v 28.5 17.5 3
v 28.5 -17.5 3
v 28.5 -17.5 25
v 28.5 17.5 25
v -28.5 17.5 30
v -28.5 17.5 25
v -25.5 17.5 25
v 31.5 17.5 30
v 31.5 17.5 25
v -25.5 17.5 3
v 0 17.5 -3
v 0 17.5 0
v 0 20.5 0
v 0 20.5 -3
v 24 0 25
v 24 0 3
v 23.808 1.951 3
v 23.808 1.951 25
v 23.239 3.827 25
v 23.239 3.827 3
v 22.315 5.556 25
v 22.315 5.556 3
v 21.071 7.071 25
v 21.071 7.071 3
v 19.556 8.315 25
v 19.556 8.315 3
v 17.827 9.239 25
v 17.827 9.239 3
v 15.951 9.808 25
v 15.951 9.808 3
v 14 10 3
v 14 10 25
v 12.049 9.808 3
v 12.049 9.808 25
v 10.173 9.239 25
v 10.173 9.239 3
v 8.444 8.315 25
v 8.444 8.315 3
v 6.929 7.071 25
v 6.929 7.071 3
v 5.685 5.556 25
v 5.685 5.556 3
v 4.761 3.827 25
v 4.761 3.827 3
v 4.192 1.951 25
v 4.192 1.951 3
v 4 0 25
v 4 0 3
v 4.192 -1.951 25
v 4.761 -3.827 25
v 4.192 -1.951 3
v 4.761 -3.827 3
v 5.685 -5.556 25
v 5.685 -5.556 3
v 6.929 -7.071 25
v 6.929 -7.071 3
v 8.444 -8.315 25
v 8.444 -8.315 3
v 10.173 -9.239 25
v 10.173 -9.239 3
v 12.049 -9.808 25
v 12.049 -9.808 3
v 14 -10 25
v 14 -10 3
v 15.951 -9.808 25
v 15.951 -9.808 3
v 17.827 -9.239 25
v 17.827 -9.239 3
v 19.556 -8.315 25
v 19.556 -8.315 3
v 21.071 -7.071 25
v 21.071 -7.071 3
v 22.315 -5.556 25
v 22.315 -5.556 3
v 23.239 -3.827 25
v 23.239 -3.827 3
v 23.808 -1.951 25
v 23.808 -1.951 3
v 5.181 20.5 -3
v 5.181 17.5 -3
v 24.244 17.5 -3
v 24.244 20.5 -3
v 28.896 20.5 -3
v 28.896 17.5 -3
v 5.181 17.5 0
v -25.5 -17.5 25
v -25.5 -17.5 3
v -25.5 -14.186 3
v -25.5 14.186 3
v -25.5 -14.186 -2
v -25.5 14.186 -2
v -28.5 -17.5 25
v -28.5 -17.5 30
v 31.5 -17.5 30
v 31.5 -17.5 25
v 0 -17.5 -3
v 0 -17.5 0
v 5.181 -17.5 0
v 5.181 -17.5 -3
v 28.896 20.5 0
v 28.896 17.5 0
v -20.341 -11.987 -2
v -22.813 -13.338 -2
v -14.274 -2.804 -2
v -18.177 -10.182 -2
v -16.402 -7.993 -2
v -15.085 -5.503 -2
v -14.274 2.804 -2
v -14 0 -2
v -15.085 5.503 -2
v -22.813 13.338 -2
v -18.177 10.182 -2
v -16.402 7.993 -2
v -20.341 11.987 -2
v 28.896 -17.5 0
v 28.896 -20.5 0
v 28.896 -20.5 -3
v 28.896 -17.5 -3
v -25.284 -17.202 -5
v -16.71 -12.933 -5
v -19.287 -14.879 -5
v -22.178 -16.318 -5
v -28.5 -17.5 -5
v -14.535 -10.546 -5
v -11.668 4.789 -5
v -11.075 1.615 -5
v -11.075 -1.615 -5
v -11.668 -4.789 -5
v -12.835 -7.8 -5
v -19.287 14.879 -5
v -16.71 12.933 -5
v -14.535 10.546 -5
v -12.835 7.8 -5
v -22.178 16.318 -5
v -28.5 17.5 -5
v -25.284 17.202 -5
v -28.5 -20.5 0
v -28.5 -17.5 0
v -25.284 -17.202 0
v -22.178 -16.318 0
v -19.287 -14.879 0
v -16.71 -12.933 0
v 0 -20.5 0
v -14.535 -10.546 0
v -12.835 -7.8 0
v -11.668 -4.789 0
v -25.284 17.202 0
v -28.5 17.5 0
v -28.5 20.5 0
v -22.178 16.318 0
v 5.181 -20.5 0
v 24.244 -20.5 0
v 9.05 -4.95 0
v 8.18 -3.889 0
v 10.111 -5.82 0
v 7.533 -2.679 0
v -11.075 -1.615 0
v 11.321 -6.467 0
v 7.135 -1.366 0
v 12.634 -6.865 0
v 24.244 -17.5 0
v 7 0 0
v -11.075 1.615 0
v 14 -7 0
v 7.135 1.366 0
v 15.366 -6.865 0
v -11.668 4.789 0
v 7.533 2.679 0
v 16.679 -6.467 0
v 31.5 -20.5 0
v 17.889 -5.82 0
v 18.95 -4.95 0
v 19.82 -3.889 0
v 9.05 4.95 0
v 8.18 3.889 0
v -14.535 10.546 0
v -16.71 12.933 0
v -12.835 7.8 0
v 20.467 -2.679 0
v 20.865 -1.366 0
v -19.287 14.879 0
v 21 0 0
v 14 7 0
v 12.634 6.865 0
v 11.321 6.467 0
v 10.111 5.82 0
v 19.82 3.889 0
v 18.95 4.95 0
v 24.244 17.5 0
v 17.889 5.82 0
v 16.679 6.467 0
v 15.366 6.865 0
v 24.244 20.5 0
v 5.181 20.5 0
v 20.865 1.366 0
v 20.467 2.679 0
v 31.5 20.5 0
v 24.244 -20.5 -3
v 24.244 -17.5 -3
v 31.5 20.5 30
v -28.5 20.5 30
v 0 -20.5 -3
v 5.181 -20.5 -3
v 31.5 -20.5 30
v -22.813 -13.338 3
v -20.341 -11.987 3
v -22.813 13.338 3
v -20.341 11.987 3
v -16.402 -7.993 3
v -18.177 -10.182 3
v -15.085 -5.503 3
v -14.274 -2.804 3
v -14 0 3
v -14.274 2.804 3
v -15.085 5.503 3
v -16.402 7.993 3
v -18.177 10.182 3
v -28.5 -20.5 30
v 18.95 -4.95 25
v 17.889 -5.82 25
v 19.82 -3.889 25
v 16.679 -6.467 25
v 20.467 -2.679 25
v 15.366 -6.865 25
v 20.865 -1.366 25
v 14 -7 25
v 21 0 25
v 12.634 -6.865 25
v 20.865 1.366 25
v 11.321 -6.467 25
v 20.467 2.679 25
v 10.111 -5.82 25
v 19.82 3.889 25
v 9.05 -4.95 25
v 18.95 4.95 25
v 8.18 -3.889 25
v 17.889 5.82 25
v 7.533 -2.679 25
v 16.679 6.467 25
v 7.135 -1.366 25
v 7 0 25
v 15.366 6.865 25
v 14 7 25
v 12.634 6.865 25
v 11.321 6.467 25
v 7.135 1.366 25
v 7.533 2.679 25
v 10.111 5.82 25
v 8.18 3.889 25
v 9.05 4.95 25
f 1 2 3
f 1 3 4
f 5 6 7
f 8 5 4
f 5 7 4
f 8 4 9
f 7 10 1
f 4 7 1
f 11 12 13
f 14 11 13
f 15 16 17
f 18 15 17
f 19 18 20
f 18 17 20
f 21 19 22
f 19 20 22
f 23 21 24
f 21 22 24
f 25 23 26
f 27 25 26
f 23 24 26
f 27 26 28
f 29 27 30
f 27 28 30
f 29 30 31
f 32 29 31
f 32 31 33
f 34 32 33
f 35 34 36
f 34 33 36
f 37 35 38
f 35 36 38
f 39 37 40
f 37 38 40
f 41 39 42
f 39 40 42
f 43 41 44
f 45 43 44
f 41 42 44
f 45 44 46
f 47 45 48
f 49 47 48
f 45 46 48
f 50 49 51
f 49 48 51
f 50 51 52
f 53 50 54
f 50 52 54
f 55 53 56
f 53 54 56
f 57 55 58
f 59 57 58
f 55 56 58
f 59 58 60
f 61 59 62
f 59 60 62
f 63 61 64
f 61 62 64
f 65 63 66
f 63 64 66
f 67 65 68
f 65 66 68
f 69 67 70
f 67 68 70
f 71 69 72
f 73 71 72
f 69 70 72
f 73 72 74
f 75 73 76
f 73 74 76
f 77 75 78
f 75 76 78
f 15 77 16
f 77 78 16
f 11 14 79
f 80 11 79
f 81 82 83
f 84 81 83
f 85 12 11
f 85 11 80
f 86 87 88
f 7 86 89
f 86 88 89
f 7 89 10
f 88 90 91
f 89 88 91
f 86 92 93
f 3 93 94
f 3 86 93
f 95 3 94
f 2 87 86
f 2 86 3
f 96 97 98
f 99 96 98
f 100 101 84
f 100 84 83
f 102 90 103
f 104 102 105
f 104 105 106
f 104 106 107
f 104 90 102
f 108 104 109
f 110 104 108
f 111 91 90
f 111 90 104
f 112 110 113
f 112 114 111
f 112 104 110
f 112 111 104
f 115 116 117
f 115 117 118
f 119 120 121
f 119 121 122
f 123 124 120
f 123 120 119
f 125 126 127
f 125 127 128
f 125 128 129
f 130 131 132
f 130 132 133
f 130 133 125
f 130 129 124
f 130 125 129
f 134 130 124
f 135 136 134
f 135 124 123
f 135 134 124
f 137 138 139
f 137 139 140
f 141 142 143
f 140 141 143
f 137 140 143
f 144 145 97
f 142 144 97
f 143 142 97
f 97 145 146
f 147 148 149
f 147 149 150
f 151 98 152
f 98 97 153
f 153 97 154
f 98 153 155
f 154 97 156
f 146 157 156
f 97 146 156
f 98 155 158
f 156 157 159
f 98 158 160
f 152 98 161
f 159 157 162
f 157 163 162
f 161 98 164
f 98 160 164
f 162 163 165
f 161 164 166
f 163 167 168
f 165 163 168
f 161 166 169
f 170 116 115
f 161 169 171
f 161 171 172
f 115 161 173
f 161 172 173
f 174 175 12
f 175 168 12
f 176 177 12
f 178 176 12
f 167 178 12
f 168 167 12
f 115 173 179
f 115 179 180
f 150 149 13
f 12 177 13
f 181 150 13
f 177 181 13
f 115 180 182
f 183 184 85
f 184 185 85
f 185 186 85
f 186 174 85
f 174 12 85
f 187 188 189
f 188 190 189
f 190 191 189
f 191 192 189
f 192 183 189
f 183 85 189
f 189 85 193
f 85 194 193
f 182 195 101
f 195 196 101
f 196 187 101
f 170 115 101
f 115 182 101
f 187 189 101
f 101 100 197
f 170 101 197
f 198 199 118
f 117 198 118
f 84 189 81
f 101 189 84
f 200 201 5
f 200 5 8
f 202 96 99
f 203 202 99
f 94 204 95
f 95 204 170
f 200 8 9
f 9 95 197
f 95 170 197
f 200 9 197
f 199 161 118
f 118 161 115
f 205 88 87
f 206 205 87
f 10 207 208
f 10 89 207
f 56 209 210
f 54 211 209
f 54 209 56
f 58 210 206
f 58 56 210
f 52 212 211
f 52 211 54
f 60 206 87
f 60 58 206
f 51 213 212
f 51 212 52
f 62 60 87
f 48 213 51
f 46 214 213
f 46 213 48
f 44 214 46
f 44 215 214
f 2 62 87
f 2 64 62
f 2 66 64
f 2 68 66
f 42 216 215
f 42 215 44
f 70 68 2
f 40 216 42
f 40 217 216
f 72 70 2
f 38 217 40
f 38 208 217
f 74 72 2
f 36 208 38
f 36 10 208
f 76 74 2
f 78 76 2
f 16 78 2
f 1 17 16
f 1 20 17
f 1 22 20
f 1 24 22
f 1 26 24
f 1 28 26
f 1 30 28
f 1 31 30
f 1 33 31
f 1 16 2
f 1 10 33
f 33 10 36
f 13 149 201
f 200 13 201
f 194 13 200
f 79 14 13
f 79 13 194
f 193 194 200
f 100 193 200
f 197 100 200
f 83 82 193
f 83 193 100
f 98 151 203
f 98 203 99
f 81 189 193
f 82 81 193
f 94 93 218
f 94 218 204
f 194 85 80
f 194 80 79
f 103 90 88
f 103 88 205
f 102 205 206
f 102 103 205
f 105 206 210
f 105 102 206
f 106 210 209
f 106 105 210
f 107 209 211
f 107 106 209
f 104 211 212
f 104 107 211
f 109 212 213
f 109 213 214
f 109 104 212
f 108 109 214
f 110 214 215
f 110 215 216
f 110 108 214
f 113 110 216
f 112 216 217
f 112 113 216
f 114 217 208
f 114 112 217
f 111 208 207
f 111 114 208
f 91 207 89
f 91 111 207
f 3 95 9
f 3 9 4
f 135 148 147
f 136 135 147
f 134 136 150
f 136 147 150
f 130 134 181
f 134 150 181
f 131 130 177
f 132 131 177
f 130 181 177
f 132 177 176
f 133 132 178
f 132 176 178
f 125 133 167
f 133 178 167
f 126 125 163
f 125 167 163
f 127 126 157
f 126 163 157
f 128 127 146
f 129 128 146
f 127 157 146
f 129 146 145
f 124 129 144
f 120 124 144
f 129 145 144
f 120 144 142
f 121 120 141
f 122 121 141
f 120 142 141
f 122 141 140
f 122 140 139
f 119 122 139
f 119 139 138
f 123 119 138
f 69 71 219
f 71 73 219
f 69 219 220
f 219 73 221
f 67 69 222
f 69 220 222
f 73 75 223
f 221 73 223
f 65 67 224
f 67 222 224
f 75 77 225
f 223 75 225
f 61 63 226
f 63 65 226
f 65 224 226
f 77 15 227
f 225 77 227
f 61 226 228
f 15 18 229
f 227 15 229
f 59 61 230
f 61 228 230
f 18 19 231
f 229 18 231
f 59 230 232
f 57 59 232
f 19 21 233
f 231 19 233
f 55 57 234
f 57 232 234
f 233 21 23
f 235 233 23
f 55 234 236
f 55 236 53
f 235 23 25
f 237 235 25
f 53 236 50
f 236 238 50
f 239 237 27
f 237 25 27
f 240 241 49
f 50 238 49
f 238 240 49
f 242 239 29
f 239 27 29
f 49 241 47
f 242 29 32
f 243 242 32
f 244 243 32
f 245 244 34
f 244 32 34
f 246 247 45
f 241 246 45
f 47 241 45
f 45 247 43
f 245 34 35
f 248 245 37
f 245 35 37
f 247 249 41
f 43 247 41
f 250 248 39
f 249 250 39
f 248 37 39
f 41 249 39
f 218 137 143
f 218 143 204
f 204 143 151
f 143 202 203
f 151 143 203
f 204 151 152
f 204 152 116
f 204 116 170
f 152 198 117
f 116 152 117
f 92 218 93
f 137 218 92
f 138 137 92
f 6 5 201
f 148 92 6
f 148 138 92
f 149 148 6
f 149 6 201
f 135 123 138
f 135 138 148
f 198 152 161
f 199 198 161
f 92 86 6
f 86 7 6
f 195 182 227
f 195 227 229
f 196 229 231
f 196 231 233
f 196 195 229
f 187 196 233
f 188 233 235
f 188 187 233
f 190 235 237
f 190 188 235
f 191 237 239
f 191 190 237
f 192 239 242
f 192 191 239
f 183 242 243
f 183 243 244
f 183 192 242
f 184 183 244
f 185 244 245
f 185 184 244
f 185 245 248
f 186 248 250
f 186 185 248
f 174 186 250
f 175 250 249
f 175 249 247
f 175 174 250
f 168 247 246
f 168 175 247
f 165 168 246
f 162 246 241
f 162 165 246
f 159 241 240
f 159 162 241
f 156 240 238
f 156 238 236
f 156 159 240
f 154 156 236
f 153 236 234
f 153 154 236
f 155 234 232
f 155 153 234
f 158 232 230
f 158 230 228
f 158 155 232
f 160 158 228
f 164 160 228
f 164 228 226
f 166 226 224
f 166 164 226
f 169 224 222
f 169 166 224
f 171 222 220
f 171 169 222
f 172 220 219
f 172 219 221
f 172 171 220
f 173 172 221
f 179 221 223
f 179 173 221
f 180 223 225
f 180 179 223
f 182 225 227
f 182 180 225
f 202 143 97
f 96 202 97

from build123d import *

# Parameters (mm, degrees)
SKETCH1_R           = 7
BOSS_EXTRUDE1_DEPTH = 25
BOSS_EXTRUDE2_DEPTH = 5
SKETCH1_4_W         = 60
SKETCH1_4_H         = 3
BOSS_EXTRUDE3_DEPTH = 30
SKETCH1_5_W         = 5.181024341
SKETCH1_5_H         = 3
SKETCH1_5_W_2       = 4.652035809
BOSS_EXTRUDE4_DEPTH = 3
SHELL2_START        = 3
SHELL2_OUTLINE_W    = 54
SHELL2_OUTLINE_H    = 35
SHELL2_OUTLINE_R    = 10
SHELL2_DEPTH        = 22
SHELL2_START_2      = -2
SHELL2_2_DEPTH      = 5


# Read off the part's stored shape, not the designer's step: Shell2
with BuildPart() as part:
    # Sketch1 → Boss-Extrude1 (new body)
    # profile 1 of 2: a face of its own
    with BuildSketch(Plane.XY):
        with BuildLine():
            Line((-28.5, 17.5), (14, 17.5))
            Line((14, 17.5), (31.5, 17.5))
            Line((31.5, 17.5), (31.5, -17.5))
            Line((31.5, -17.5), (14, -17.5))
            Line((14, -17.5), (-28.5, -17.5))
            ThreePointArc((-28.5, -17.5), (-11, 0), (-28.5, 17.5))
        make_face()
        with Locations((14, 0)):
            Circle(SKETCH1_R, mode=Mode.SUBTRACT)
    # profile 2 of 2: a face of its own
    with BuildSketch(Plane.XY):
        with BuildLine():
            ThreePointArc((-28.5, 17.5), (-11, 0), (-28.5, -17.5))
            Line((-28.5, -17.5), (-28.5, 17.5))
        make_face()
    extrude(amount=BOSS_EXTRUDE1_DEPTH)

    # Sketch1<3> → Boss-Extrude2 (add)
    with BuildSketch(Plane.XY):
        with BuildLine():
            ThreePointArc((-28.5, 17.5), (-11, 0), (-28.5, -17.5))
            Line((-28.5, -17.5), (-28.5, 17.5))
        make_face()
    extrude(amount=-BOSS_EXTRUDE2_DEPTH)

    # Sketch1<4> → Boss-Extrude3 (add)
    with BuildSketch(Plane.XY):
        with Locations((1.5, 19)):
            Rectangle(SKETCH1_4_W, SKETCH1_4_H)
        with Locations((1.5, -19)):
            Rectangle(SKETCH1_4_W, SKETCH1_4_H)
    extrude(amount=BOSS_EXTRUDE3_DEPTH)

    # Sketch1<5> → Boss-Extrude4 (add)
    with BuildSketch(Plane.XY):
        with Locations((2.590512171, 19)):
            Rectangle(SKETCH1_5_W, SKETCH1_5_H)
        with Locations((2.590512171, -19)):
            Rectangle(SKETCH1_5_W, SKETCH1_5_H)
        with Locations((26.569558343, 19)):
            Rectangle(SKETCH1_5_W_2, SKETCH1_5_H)
        with Locations((26.569558343, -19)):
            Rectangle(SKETCH1_5_W_2, SKETCH1_5_H)
    extrude(amount=-BOSS_EXTRUDE4_DEPTH)

    # Shell2 outline → Shell2 (cut)
    with BuildSketch(Plane.XY.offset(SHELL2_START)):
        with Locations((1.5, 0)):
            Rectangle(SHELL2_OUTLINE_W, SHELL2_OUTLINE_H)
        with Locations((14, 0)):
            Circle(SHELL2_OUTLINE_R, mode=Mode.SUBTRACT)
    extrude(amount=SHELL2_DEPTH, mode=Mode.SUBTRACT)

    # Shell2 2 outline → Shell2 2 (cut)
    with BuildSketch(Plane.XY.offset(SHELL2_START_2)):
        with BuildLine():
            ThreePointArc((-25.5, -14.186260959), (-14, 0), (-25.5, 14.186260959))
            Line((-25.5, 14.186260959), (-25.5, -14.186260959))
        make_face()
    extrude(amount=SHELL2_2_DEPTH, mode=Mode.SUBTRACT)


solid = part.part
